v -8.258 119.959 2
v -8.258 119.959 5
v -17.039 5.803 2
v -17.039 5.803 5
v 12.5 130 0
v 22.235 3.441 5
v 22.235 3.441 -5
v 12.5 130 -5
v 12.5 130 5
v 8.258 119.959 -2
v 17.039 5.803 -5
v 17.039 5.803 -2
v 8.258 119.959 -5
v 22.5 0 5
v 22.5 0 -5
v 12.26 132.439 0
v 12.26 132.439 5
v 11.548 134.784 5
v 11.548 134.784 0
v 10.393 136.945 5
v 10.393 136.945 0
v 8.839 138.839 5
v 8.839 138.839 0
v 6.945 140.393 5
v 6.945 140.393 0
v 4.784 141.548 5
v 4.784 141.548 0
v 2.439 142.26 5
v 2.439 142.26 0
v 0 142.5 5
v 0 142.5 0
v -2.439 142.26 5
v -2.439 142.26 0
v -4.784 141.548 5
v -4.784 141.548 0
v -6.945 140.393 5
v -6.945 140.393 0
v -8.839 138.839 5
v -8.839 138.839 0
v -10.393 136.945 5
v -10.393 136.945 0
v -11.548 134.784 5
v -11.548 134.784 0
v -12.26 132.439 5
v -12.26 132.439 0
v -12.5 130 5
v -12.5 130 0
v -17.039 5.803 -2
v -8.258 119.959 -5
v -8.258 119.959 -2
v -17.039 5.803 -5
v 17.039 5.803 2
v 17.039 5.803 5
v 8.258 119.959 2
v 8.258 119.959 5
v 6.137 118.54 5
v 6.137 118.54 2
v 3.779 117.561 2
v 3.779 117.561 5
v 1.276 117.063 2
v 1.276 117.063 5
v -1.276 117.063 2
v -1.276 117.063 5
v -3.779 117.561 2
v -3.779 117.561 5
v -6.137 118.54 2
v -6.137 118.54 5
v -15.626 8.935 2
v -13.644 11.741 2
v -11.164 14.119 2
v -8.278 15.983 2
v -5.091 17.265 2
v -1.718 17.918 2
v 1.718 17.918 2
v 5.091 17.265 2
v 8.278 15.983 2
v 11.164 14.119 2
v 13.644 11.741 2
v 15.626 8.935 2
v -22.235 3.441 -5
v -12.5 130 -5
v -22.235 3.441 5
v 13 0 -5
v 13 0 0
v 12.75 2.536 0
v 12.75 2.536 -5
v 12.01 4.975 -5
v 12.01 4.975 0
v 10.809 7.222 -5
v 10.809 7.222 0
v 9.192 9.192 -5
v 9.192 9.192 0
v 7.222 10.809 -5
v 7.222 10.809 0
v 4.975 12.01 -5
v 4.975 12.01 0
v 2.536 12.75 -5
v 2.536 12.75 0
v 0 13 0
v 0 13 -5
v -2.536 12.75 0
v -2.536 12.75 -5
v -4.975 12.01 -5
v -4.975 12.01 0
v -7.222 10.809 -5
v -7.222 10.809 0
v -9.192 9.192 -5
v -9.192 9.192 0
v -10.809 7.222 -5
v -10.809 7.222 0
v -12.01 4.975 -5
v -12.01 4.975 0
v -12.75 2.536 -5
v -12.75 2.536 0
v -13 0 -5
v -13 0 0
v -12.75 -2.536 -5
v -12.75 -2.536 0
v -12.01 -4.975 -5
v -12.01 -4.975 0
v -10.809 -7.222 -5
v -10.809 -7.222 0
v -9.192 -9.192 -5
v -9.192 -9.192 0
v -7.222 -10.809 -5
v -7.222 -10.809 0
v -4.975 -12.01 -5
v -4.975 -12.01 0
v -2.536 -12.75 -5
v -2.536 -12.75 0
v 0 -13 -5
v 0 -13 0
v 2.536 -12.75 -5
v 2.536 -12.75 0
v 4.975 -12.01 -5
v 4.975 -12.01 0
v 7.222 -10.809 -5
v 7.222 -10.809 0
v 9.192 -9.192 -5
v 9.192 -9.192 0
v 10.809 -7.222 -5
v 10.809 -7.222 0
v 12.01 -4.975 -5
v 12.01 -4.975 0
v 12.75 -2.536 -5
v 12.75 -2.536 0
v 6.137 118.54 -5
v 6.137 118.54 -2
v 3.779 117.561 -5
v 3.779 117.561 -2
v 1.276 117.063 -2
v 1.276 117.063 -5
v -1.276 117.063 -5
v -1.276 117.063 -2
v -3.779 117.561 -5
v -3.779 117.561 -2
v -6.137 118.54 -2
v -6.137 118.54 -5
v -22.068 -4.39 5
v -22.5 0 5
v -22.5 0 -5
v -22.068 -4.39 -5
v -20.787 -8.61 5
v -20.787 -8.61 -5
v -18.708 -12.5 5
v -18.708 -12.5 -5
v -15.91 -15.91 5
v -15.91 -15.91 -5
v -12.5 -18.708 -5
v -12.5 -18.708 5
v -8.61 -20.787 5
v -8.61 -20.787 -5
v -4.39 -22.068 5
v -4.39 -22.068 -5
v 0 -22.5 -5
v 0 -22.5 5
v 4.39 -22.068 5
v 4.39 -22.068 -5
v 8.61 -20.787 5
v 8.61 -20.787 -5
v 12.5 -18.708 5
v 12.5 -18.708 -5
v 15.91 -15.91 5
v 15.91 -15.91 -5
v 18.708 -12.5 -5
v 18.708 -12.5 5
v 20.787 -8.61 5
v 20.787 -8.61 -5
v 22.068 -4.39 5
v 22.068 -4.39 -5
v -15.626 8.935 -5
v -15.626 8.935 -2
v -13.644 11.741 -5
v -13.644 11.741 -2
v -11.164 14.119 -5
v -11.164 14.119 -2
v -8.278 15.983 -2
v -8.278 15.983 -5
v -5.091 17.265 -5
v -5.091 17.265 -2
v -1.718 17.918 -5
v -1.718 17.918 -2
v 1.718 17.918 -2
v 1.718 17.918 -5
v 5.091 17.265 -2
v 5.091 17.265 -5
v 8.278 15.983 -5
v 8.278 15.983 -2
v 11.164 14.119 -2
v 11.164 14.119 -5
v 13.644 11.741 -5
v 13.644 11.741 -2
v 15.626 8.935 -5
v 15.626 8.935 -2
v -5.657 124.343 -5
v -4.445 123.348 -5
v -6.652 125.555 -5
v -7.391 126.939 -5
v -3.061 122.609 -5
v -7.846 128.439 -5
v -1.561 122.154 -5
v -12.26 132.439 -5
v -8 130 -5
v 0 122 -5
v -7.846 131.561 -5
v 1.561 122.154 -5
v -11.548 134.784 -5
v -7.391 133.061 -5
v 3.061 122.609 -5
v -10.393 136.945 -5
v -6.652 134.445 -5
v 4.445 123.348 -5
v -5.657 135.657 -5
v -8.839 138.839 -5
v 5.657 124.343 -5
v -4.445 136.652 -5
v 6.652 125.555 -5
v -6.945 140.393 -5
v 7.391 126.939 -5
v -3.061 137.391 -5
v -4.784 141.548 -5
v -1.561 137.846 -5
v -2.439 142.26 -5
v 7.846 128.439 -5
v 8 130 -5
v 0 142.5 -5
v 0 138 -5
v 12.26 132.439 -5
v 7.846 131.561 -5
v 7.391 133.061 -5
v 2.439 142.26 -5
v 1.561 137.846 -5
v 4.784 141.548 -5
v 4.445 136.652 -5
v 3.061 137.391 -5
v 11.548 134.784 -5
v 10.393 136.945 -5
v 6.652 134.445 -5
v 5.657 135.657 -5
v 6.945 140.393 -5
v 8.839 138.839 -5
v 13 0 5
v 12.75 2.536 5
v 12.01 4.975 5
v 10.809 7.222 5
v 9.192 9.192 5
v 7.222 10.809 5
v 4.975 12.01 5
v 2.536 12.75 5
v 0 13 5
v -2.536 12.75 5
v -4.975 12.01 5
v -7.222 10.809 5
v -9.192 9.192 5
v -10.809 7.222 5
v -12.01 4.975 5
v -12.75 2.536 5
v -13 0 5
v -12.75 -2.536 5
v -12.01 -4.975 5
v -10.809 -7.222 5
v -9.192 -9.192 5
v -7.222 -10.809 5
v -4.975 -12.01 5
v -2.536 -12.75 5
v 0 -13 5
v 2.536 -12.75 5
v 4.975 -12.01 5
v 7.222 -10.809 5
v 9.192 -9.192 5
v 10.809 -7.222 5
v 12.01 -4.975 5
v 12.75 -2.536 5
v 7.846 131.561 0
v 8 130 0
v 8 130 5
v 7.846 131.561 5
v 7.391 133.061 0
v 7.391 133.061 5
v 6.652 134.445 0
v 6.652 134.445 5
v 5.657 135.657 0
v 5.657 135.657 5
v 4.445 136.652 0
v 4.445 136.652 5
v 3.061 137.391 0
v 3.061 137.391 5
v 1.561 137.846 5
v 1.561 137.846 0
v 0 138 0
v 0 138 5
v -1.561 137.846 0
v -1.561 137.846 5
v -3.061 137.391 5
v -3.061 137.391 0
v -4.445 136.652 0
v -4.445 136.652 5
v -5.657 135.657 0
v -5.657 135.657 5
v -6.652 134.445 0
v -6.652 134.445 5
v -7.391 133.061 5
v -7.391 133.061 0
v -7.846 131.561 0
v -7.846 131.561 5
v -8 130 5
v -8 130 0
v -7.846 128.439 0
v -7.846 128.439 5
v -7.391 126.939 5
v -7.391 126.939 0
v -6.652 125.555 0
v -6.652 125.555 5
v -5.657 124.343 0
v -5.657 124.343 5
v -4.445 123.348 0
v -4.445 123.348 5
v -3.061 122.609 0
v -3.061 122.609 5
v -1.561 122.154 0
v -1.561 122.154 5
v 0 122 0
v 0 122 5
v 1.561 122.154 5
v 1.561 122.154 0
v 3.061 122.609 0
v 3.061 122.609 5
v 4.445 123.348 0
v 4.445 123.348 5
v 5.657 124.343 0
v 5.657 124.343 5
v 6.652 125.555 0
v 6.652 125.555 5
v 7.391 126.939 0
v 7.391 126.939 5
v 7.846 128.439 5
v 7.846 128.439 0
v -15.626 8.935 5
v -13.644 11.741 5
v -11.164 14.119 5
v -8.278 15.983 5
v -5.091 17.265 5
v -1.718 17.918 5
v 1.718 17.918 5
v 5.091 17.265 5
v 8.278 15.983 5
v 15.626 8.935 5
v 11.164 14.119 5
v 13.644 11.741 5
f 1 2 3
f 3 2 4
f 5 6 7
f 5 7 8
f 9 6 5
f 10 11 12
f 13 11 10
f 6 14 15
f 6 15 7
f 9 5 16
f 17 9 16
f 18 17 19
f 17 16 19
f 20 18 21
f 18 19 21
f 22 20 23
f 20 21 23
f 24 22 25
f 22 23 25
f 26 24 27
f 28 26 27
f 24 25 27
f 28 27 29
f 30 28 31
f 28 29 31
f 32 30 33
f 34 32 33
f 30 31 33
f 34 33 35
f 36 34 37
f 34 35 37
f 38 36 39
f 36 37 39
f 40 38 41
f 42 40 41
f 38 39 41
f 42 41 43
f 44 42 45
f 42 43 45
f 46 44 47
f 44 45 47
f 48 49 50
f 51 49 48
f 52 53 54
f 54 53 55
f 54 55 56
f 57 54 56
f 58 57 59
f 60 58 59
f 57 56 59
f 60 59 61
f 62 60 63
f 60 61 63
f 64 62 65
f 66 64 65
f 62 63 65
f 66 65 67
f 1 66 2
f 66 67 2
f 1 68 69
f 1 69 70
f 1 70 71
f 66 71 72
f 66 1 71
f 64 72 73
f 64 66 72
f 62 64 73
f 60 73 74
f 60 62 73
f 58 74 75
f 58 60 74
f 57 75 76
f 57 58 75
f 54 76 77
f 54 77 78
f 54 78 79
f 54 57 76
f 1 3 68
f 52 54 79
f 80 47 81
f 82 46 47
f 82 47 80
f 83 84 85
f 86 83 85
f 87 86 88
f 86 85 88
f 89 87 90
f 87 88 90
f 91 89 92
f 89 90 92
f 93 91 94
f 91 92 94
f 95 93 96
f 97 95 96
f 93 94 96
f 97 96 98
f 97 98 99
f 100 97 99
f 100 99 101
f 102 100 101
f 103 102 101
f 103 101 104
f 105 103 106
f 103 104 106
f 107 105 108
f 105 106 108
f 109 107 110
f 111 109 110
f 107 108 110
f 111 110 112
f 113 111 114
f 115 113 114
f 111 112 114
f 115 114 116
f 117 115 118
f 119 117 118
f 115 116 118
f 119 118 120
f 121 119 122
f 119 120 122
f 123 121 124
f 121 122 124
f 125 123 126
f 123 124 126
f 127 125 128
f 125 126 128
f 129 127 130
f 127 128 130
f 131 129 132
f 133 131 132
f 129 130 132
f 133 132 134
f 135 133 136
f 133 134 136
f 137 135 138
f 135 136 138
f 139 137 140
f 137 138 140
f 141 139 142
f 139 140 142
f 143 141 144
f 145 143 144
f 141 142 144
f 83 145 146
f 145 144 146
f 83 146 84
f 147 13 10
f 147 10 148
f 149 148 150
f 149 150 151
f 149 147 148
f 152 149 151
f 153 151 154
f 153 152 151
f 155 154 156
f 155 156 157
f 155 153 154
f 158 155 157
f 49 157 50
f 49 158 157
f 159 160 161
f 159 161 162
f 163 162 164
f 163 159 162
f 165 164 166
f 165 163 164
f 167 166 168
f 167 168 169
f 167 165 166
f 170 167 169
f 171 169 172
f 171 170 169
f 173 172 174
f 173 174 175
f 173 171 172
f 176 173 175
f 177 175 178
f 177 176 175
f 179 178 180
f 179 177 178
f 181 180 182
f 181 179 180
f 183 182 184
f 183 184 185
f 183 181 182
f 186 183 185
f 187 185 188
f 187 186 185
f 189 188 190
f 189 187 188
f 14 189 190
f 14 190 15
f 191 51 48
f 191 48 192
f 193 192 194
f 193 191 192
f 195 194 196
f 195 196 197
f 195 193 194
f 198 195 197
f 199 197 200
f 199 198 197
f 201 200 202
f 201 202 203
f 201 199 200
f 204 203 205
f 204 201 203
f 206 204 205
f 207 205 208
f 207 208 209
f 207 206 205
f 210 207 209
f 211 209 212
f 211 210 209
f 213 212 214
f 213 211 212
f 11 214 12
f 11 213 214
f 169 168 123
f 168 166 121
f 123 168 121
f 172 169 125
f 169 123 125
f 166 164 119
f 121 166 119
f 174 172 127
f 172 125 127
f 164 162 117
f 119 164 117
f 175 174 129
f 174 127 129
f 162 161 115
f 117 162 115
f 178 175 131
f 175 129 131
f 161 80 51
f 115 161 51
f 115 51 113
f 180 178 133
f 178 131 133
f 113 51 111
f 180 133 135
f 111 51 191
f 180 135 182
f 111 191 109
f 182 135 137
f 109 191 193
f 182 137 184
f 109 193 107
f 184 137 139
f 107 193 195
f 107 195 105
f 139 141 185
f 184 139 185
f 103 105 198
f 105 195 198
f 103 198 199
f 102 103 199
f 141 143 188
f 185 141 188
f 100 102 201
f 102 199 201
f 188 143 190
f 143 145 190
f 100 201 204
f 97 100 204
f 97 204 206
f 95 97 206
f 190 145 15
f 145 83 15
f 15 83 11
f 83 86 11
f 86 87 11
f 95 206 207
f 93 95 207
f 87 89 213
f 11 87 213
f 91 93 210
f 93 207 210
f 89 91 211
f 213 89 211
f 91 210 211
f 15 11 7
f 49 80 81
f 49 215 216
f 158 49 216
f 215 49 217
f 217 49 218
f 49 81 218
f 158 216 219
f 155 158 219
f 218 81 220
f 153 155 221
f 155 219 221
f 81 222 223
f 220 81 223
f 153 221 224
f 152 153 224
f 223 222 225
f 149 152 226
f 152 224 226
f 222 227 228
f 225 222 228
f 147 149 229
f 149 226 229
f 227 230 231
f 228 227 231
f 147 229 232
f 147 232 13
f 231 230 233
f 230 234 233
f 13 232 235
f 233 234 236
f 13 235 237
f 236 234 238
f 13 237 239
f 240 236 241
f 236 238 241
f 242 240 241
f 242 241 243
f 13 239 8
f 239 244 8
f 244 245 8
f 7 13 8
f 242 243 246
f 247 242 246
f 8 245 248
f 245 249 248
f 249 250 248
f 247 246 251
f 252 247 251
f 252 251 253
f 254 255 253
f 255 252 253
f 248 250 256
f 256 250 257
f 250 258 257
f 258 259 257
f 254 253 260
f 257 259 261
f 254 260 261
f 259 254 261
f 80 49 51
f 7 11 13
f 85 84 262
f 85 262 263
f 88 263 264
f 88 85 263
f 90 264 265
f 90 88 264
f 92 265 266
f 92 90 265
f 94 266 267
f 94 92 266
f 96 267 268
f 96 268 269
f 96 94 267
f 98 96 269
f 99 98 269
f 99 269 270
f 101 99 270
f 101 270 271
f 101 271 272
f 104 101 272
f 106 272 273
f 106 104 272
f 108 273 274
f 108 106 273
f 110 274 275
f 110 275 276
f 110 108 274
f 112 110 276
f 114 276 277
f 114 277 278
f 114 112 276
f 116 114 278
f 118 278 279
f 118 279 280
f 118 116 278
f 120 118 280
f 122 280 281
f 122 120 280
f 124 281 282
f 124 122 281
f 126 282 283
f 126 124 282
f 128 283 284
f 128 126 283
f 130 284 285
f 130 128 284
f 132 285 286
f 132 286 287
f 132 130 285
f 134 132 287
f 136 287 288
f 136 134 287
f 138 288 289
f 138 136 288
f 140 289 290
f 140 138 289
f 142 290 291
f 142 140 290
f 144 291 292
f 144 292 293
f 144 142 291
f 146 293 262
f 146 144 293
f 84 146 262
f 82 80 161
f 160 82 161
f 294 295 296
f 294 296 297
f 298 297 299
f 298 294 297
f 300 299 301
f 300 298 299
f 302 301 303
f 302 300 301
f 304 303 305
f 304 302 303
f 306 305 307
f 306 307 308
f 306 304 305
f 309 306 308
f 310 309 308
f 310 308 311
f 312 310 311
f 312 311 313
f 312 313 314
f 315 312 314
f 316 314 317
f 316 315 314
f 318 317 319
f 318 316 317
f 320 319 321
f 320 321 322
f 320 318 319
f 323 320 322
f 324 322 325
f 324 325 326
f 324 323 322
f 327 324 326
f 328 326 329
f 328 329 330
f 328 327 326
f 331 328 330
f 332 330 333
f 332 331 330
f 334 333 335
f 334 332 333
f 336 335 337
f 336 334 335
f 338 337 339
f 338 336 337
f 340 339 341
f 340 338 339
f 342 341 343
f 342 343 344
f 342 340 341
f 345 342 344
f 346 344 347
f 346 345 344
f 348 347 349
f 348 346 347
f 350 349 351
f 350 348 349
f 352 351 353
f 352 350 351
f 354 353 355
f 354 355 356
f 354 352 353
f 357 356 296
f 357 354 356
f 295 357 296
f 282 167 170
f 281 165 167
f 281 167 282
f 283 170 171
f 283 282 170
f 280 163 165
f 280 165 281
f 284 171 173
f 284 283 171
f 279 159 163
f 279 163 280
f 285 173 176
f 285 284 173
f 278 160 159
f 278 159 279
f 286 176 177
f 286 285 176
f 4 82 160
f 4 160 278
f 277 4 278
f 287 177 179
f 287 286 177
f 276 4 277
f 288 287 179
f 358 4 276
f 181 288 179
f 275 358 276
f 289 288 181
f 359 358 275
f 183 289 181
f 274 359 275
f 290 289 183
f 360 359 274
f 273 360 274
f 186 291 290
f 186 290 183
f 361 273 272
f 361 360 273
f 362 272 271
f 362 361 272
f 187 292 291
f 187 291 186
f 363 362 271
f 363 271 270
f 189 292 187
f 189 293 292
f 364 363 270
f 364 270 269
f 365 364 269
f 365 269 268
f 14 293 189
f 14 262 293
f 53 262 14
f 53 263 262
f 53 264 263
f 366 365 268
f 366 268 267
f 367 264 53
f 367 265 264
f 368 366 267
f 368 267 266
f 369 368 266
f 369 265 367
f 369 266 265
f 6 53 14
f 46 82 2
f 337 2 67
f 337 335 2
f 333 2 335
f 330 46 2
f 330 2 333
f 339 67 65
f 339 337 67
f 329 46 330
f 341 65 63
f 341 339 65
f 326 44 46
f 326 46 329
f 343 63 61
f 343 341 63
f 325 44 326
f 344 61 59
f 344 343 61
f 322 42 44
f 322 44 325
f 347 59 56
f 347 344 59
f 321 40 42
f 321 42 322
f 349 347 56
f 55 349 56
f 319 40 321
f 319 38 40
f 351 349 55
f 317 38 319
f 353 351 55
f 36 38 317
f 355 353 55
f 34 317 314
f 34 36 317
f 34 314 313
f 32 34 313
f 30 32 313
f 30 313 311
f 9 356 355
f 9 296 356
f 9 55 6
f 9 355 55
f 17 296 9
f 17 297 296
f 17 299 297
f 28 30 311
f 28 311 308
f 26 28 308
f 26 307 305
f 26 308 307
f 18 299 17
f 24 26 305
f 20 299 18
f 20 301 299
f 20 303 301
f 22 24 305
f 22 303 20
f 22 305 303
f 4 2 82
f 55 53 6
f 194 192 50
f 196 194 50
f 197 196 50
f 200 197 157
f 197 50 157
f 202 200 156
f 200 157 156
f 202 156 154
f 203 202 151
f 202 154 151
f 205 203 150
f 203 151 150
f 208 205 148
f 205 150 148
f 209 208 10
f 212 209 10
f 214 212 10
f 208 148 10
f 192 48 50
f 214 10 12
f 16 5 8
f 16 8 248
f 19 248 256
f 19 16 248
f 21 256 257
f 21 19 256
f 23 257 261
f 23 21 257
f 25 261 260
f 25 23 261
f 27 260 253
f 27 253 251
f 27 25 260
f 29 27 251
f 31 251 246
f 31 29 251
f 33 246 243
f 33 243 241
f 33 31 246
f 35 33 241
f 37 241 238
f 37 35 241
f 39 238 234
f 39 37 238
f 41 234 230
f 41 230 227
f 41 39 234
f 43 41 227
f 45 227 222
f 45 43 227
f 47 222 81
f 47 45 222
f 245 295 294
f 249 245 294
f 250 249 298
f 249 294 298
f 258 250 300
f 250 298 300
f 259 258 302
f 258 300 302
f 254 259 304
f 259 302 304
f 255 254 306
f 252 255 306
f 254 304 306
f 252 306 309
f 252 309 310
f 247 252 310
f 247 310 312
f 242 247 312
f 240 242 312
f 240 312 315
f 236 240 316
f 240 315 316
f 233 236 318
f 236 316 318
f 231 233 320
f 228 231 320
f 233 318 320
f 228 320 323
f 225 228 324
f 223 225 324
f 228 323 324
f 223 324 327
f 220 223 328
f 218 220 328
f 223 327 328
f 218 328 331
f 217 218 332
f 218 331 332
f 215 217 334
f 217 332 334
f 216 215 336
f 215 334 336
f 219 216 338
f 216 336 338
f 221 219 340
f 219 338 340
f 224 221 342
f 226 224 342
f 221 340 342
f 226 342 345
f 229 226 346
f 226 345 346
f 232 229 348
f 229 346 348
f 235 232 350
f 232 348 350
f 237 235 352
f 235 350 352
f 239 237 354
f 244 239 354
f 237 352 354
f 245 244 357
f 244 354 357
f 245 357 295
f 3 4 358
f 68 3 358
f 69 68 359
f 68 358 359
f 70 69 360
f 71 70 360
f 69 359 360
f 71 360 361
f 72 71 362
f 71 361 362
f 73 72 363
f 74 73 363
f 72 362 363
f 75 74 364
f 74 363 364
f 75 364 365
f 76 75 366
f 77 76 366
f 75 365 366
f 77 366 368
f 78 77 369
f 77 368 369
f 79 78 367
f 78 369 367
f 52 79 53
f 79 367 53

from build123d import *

# Parameters (mm, degrees)
SKETCH2_R           = 12.5
SKETCH2_R_2         = 8
SKETCH2_R_3         = 13
BOSS_EXTRUDE1_DEPTH = 5
CUT_EXTRUDE1_DEPTH  = 3


with BuildPart() as part:
    # Sketch2 → Boss-Extrude1 (new, symmetric)
    # profile 1 of 3: a face of its own
    with BuildSketch(Plane.XY):
        with Locations((0, 130)):
            Circle(SKETCH2_R)
        with Locations((0, 130)):
            Circle(SKETCH2_R_2, mode=Mode.SUBTRACT)
    # profile 2 of 3: a face of its own
    with BuildSketch(Plane.XY):
        with BuildLine():
            Line((-12.5, 130), (-22.235294118, 3.441176471))
            ThreePointArc((-22.235294118, 3.441176471), (0, 22.5), (22.235294118, 3.441176471))
            Line((22.235294118, 3.441176471), (12.5, 130))
            ThreePointArc((12.5, 130), (0, 117.5), (-12.5, 130))
        make_face()
    # profile 3 of 3: a face of its own
    with BuildSketch(Plane.XY):
        with BuildLine():
            Line((-22.235294118, 3.441176471), (-22.5, 0))
            ThreePointArc((-22.5, 0), (0, -22.5), (22.5, 0))
            Line((22.5, 0), (22.235294118, 3.441176471))
            ThreePointArc((22.235294118, 3.441176471), (0, 22.5), (-22.235294118, 3.441176471))
        make_face()
        Circle(SKETCH2_R_3, mode=Mode.SUBTRACT)
    extrude(amount=BOSS_EXTRUDE1_DEPTH, both=True)

    # Sketch3 → Cut-Extrude1 (cut)
    with BuildSketch(Plane.XY.offset(5)):
        with BuildLine():
            Line((-8.257578004, 119.959461892), (-17.038818827, 5.803331197))
            ThreePointArc((-17.038818827, 5.803331197), (0, 18), (17.038818827, 5.803331197))
            Line((17.038818827, 5.803331197), (8.257578004, 119.959461892))
            ThreePointArc((8.257578004, 119.959461892), (0, 117), (-8.257578004, 119.959461892))
        make_face()
    cut_extrude1 = extrude(amount=-CUT_EXTRUDE1_DEPTH, mode=Mode.SUBTRACT)

    # Mirror1: Cut-Extrude1 across plane
    add(cut_extrude1.mirror(Plane.XY), mode=Mode.SUBTRACT)


solid = part.part
